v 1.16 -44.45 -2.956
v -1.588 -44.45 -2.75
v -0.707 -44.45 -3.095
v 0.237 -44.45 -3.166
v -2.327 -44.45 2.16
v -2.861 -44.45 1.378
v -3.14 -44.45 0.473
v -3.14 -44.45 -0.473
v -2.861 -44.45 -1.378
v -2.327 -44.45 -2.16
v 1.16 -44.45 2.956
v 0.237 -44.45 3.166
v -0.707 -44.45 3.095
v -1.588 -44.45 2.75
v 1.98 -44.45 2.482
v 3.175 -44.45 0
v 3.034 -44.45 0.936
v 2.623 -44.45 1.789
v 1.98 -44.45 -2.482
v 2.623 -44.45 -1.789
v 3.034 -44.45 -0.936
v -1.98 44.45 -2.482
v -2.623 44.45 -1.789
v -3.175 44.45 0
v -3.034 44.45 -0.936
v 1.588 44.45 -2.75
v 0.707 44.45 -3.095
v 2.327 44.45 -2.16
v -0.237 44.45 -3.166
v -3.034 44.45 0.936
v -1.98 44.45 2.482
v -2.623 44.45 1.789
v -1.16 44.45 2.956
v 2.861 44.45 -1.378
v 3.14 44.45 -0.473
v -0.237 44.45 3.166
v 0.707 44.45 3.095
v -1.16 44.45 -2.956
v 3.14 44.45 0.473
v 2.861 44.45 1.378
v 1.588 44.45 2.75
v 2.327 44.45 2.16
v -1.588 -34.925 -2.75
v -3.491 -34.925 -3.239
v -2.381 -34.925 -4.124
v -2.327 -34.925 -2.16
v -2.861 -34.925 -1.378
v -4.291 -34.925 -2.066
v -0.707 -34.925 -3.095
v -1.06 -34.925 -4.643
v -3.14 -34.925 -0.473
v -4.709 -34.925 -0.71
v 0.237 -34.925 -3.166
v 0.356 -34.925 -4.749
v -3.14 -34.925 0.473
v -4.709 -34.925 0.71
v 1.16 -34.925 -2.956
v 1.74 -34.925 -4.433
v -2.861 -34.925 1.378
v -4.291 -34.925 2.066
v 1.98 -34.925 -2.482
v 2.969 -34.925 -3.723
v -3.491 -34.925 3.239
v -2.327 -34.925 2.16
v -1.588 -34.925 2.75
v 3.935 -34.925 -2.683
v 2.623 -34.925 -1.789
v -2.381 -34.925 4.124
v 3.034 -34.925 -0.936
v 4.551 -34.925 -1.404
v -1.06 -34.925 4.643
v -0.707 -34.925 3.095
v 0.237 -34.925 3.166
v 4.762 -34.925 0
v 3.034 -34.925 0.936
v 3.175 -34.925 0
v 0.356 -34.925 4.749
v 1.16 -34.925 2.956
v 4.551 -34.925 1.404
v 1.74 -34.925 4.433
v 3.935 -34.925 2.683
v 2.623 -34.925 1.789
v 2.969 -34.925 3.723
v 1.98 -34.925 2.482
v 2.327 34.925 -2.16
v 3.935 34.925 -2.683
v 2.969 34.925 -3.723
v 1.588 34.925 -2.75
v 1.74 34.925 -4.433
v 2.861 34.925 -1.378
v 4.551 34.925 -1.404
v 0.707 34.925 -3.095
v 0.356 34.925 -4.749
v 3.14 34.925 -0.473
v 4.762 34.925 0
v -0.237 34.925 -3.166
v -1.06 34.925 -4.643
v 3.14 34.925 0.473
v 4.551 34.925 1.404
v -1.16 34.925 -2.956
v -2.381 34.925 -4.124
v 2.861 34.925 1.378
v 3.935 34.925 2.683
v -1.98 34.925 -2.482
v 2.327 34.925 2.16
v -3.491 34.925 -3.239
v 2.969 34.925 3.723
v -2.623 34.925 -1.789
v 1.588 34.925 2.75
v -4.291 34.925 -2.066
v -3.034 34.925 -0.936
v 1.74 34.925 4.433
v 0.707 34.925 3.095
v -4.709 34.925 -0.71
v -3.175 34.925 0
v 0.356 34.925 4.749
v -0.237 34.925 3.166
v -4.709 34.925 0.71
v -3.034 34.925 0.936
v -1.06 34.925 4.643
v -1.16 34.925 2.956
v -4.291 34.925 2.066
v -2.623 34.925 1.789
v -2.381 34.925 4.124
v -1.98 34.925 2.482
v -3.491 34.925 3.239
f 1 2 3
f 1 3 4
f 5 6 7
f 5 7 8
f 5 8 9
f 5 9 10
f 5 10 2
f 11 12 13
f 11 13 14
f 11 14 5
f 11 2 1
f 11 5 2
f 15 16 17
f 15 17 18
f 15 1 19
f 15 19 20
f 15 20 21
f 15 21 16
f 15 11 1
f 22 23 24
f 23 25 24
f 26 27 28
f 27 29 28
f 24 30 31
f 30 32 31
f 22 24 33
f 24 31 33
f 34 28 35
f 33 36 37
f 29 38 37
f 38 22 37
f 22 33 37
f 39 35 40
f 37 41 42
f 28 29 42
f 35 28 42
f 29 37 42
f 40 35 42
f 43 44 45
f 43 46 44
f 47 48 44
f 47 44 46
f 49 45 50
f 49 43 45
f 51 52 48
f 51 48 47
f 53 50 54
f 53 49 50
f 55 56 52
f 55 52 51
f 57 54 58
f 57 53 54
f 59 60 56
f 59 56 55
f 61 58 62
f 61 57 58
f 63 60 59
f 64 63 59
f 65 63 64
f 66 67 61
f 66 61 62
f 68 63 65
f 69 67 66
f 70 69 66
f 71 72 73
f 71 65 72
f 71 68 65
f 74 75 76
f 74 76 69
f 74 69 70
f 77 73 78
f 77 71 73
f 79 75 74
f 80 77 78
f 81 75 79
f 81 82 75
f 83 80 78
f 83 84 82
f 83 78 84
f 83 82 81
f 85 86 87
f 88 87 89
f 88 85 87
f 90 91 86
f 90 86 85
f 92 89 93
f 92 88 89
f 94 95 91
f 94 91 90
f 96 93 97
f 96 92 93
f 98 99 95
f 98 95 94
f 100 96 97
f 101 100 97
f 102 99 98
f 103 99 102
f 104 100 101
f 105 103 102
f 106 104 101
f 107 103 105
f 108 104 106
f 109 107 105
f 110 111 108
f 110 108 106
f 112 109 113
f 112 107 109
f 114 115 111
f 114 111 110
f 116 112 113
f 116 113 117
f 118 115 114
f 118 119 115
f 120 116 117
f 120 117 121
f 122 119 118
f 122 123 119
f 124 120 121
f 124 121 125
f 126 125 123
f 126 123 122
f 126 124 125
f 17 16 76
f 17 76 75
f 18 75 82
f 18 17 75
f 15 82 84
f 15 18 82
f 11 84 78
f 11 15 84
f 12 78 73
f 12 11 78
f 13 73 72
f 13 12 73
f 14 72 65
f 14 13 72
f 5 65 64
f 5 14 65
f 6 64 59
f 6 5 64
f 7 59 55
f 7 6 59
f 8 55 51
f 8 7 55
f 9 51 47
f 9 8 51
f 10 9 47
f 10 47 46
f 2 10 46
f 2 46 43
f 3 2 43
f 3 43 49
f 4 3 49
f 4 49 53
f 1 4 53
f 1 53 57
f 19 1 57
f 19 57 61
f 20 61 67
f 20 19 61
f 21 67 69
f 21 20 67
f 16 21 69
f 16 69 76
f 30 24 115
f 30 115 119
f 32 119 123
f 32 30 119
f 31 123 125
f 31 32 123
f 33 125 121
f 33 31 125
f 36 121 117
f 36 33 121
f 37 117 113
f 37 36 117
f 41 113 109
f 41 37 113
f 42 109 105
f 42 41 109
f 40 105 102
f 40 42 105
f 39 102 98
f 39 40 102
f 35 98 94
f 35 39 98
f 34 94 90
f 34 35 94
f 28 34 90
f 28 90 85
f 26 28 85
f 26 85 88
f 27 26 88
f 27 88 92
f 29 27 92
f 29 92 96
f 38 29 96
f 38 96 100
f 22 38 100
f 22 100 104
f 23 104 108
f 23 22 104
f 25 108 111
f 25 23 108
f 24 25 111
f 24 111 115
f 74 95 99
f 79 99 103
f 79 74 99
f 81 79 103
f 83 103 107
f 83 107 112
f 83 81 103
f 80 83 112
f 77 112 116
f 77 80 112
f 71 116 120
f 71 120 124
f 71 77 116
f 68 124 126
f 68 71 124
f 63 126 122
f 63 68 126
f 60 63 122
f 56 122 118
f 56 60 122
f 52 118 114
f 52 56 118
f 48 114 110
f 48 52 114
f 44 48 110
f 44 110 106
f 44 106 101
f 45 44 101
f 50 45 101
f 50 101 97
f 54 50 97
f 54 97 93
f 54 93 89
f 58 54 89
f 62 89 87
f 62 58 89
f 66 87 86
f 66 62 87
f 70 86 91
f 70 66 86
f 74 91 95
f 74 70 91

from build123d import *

# Parameters (mm, degrees)
F0_R     = 4.7625
F1_DEPTH = 44.45
F2_R     = 6.35
F2_R_2   = 3.175
F3_DEPTH = 9.525
F4_R     = 6.35
F4_R_2   = 3.175
F5_DEPTH = 9.525


with BuildPart() as f1:
    # F0 (on Front) → F1 (new body, symmetric)
    with BuildSketch(Plane.XZ):
        Circle(F0_R)
    extrude(amount=F1_DEPTH, both=True)

    # F2 (on face) → F3 (cut)
    with BuildSketch(Plane.XZ.offset(44.45)):
        Circle(F2_R)
        Circle(F2_R_2, mode=Mode.SUBTRACT)
    extrude(amount=-F3_DEPTH, mode=Mode.SUBTRACT)

    # F4 (on face) → F5 (cut)
    with BuildSketch(Plane(origin=(0, 44.45, 0), x_dir=(-1, 0, 0), z_dir=(0, 1, 0))):
        Circle(F4_R)
        Circle(F4_R_2, mode=Mode.SUBTRACT)
    extrude(amount=-F5_DEPTH, mode=Mode.SUBTRACT)


solid = f1.part
